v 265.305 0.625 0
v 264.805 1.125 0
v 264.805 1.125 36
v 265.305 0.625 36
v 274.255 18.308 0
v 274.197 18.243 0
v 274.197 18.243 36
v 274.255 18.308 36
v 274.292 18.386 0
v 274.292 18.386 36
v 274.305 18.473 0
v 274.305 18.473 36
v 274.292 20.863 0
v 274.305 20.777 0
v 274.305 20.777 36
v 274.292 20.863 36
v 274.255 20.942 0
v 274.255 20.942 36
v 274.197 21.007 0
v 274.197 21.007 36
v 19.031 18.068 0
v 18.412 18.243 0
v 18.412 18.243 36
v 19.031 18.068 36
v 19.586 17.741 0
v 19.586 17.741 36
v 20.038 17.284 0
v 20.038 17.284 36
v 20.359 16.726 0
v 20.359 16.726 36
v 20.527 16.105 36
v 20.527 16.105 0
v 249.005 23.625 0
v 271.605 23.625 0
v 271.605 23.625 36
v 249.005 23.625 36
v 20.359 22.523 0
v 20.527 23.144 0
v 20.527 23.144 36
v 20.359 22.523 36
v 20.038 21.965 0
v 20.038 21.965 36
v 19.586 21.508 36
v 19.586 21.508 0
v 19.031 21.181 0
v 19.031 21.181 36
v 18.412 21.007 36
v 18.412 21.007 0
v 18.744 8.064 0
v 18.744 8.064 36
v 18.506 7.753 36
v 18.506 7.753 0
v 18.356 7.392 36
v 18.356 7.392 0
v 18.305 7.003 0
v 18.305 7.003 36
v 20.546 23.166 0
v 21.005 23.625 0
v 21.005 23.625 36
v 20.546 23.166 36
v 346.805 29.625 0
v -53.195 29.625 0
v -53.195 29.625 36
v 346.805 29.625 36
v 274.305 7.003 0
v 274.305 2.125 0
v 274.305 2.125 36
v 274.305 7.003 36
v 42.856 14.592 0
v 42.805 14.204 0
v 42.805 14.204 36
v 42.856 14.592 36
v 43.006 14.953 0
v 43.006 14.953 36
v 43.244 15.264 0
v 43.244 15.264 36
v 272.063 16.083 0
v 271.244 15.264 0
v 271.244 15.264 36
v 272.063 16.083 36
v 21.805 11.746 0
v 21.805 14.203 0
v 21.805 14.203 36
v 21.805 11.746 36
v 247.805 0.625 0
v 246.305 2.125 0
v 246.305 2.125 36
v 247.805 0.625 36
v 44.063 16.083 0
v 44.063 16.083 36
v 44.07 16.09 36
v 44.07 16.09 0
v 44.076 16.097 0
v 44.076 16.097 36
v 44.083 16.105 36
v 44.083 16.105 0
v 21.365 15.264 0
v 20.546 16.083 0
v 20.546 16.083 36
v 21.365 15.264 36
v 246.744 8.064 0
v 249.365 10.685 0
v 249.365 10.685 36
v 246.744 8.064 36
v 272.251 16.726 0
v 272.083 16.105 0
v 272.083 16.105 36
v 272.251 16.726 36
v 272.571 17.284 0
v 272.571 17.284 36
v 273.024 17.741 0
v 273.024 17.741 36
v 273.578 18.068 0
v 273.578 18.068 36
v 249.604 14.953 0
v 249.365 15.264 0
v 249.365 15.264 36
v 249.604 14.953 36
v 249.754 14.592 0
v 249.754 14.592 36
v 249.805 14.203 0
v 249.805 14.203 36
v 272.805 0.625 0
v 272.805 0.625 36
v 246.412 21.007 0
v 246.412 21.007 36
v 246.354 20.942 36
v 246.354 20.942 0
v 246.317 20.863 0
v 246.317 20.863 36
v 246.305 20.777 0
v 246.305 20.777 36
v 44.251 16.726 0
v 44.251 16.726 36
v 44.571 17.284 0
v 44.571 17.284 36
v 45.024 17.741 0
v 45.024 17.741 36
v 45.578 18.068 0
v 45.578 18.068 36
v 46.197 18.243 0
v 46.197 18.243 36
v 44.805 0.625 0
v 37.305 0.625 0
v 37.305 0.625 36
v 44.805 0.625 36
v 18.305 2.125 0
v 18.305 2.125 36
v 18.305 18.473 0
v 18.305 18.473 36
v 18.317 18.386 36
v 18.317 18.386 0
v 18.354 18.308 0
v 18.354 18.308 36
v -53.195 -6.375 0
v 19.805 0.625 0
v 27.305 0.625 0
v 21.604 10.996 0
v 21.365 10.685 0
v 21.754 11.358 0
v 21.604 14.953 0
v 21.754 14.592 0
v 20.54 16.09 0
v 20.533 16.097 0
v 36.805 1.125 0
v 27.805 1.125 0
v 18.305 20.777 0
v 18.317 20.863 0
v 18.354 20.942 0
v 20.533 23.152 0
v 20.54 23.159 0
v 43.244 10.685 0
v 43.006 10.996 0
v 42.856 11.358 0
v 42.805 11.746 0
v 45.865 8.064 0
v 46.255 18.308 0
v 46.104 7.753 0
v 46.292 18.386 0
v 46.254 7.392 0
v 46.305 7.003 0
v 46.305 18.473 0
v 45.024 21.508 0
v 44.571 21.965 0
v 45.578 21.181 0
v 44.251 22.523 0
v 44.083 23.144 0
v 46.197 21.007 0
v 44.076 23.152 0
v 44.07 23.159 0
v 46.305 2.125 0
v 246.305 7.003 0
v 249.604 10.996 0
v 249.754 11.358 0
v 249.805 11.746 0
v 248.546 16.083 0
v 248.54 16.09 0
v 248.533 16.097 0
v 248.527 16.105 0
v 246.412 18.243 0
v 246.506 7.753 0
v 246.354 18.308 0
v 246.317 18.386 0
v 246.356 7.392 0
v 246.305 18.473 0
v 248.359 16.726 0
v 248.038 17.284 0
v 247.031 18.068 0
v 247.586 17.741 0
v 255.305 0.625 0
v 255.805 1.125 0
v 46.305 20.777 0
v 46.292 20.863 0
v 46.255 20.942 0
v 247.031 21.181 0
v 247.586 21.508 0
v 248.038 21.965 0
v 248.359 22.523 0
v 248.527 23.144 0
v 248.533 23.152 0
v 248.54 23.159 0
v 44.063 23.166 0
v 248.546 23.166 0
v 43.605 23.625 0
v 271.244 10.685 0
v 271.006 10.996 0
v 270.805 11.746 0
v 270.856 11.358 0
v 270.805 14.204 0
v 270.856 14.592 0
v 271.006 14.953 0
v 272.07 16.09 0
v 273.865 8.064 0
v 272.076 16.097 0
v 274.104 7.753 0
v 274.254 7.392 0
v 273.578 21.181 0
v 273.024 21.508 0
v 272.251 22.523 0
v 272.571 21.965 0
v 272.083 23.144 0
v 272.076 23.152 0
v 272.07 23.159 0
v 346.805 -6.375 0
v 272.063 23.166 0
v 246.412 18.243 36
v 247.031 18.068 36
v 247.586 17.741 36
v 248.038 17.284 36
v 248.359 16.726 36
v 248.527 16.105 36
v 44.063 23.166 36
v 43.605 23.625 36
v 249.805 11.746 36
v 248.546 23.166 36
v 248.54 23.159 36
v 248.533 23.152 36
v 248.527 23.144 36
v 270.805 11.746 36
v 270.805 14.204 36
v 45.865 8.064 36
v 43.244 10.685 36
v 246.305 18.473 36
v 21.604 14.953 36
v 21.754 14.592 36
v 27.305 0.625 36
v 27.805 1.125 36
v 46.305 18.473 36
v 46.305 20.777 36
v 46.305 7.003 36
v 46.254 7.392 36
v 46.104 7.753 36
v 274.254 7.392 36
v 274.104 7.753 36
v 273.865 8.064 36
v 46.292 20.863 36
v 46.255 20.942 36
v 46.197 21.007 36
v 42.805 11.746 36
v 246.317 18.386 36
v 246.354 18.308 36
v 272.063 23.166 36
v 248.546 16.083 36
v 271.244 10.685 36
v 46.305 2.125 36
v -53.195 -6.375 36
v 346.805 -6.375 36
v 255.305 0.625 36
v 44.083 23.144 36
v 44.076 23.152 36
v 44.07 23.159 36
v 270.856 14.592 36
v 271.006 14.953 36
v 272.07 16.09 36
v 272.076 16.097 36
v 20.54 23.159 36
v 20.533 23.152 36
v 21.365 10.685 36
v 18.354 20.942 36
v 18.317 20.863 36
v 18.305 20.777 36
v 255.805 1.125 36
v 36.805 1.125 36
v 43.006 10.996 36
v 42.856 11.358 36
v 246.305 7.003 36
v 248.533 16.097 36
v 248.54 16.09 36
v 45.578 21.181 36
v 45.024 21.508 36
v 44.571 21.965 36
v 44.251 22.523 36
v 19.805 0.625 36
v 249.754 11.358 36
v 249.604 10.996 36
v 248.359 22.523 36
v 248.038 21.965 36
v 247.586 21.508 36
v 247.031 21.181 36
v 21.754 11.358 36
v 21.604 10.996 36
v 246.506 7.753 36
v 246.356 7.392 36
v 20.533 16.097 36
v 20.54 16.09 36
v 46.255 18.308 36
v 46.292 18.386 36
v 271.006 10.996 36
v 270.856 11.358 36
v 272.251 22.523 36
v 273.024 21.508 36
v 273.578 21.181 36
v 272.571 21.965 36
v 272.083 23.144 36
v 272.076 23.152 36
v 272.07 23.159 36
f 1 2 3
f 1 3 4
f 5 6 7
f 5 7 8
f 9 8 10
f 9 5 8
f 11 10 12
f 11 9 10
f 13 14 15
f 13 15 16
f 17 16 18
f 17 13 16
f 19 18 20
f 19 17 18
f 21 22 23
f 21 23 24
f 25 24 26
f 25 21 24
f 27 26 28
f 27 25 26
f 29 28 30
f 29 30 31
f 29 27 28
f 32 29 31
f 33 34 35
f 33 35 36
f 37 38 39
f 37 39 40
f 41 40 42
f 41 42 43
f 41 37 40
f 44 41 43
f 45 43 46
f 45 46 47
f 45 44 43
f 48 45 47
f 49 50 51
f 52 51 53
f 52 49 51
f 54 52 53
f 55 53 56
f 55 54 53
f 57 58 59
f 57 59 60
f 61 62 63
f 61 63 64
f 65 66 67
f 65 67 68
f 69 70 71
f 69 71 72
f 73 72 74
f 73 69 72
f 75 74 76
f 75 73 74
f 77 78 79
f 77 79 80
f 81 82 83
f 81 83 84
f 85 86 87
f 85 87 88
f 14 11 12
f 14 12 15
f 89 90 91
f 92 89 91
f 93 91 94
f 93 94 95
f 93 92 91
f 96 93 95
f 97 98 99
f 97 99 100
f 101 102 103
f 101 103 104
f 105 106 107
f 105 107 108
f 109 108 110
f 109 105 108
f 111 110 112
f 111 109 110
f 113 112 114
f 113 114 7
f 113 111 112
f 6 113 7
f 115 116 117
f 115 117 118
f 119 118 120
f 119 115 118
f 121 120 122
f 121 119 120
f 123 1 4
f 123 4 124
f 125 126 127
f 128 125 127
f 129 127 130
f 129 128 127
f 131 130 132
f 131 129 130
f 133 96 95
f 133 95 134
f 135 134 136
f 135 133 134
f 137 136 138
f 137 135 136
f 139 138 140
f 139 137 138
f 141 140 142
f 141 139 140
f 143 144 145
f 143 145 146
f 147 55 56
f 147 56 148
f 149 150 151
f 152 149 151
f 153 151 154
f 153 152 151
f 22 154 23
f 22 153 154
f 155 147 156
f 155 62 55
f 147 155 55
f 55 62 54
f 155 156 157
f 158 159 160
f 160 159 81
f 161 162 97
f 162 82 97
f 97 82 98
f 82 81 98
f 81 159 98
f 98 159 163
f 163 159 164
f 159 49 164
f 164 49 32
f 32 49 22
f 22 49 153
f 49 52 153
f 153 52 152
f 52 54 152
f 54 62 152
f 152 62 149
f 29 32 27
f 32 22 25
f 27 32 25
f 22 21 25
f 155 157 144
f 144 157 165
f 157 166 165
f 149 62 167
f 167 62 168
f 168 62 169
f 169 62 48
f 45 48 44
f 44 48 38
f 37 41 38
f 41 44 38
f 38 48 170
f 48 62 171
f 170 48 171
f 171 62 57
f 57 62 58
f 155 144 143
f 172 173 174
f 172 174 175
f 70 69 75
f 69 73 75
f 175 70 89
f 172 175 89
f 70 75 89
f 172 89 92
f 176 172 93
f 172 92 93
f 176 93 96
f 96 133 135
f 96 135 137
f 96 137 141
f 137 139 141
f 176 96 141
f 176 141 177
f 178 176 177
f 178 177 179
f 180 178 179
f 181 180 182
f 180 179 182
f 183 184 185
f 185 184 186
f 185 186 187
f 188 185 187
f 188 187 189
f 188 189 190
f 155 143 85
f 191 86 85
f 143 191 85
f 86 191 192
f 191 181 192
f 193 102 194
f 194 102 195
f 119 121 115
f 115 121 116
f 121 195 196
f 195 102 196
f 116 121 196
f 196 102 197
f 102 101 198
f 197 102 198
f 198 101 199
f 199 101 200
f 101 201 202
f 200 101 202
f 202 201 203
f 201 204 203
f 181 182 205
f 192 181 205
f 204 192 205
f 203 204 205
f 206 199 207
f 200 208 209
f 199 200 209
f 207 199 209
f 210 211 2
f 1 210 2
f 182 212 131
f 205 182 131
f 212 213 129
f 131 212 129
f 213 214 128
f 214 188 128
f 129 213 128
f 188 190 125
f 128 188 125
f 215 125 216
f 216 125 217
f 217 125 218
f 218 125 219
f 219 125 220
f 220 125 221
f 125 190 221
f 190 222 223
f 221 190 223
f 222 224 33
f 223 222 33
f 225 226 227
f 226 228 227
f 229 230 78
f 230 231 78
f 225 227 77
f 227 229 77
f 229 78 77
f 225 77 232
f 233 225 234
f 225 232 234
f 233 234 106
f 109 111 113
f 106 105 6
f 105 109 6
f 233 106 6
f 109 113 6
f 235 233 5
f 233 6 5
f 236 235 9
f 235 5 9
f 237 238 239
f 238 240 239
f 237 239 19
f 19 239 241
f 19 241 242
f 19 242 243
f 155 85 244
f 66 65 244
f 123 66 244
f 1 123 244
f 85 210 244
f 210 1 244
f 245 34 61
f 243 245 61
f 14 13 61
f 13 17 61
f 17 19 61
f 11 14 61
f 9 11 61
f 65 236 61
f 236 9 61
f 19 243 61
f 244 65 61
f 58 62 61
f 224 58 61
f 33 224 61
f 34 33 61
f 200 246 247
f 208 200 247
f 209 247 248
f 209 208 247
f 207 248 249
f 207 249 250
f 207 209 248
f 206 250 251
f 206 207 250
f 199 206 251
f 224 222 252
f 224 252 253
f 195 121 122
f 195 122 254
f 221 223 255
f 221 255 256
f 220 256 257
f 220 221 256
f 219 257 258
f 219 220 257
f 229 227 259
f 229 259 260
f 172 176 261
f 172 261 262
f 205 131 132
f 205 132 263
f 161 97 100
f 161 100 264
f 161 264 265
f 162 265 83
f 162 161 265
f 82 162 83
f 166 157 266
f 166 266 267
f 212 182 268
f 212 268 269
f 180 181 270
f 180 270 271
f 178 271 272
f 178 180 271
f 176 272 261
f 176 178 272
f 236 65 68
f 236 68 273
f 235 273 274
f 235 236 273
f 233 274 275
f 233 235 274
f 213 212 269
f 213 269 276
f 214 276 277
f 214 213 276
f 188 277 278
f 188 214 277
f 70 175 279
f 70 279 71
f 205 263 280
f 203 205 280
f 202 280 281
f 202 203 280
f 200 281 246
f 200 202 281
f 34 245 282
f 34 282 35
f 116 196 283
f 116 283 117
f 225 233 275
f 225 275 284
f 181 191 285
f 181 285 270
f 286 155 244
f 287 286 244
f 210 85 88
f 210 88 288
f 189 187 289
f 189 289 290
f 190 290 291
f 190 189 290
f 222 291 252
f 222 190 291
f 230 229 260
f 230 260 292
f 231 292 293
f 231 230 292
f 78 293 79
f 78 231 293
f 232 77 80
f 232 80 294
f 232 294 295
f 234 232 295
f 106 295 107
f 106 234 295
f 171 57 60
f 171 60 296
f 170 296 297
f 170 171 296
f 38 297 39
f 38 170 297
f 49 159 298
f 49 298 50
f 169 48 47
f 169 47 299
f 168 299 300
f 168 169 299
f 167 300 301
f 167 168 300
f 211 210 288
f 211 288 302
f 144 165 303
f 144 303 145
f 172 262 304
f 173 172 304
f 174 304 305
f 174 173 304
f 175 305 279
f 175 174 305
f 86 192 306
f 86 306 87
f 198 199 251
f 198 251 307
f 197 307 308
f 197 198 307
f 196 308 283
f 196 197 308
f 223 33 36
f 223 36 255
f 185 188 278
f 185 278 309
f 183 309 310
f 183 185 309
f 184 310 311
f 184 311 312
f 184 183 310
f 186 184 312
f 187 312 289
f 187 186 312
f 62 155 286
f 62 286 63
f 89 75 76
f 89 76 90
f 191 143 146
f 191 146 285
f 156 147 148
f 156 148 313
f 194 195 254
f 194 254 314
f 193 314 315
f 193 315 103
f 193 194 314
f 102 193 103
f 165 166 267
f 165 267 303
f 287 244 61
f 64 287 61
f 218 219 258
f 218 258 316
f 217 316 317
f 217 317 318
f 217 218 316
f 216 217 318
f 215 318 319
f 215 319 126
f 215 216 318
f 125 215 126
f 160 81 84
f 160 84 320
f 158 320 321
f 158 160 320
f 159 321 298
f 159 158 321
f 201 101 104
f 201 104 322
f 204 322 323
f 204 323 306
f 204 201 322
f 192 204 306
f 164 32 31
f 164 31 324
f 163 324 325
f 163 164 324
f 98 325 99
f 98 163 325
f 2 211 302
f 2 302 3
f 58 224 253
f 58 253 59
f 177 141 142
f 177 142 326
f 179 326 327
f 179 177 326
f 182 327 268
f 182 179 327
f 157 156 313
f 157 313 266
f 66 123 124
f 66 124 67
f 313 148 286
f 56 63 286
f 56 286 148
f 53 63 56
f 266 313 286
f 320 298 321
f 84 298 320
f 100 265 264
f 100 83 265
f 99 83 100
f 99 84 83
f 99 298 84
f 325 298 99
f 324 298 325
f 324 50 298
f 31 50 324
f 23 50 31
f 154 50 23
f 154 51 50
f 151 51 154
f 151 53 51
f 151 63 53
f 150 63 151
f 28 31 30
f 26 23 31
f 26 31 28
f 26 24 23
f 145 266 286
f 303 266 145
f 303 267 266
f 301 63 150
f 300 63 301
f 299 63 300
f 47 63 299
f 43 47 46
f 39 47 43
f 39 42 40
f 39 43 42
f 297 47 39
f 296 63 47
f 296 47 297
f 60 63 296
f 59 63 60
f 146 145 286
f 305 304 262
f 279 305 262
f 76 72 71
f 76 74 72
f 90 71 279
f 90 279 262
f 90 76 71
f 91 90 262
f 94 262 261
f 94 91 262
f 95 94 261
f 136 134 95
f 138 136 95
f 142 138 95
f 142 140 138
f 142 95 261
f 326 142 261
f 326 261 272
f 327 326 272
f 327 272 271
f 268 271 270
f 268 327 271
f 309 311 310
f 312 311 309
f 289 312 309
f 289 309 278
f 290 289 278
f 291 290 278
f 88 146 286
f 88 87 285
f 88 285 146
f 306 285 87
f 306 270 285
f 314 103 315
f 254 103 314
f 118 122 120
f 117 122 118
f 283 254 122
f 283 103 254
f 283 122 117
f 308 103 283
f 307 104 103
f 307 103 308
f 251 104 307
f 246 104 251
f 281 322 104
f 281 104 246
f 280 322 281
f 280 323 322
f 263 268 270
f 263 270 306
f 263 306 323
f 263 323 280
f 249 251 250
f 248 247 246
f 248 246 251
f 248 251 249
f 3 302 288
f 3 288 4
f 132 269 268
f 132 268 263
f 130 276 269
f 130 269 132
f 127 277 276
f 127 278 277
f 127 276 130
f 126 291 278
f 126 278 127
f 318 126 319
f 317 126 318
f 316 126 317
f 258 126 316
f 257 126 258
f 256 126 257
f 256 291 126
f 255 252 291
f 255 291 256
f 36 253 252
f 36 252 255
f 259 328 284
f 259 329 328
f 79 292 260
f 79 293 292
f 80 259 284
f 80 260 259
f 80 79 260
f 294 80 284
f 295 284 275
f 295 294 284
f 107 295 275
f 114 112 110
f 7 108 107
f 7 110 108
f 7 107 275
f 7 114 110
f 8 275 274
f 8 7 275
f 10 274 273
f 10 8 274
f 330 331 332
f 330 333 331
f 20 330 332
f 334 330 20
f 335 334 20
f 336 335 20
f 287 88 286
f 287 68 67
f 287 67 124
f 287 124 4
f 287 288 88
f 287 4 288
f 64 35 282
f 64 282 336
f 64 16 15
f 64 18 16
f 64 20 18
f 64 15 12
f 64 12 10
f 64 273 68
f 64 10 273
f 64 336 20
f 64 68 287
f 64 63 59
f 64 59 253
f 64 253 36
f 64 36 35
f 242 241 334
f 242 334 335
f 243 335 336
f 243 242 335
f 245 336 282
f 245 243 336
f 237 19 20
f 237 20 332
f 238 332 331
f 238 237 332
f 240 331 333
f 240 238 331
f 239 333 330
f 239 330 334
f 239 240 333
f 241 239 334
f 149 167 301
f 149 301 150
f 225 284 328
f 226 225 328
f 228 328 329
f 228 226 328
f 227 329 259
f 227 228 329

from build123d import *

# Parameters (mm, degrees)
SKETCH_1_W      = 400
SKETCH_1_H      = 36
EXTRUDE_1_DEPTH = 36


with BuildPart() as part:
    # 草图1 → 凸台-拉伸1 (new body)
    with BuildSketch(Plane.XY):
        with Locations((146.804691074, 11.624598534)):
            Rectangle(SKETCH_1_W, SKETCH_1_H)
        with BuildLine():
            Line((18.304691074, 20.776588155), (18.304691074, 18.472608914))
            ThreePointArc((18.304691074, 18.472608914), (18.332858946, 18.345694397), (18.412073037, 18.242612627))
            ThreePointArc((18.412073037, 18.242612627), (19.826614478, 17.527140145), (20.52653516, 16.104839403))
            ThreePointArc((20.52653516, 16.104839403), (20.536242904, 16.093568263), (20.546497421, 16.082792187))
            Line((20.546497421, 16.082792187), (21.365351246, 15.263938362))
            ThreePointArc((21.365351246, 15.263938362), (21.690510372, 14.777303339), (21.804691074, 14.203278191))
            Line((21.804691074, 14.203278191), (21.804691074, 11.745724673))
            ThreePointArc((21.804691074, 11.745724673), (21.690473216, 11.171804017), (21.36535125, 10.685258701))
            Line((21.36535125, 10.685258701), (18.744030902, 8.063938362))
            ThreePointArc((18.744030902, 8.063938362), (18.418871775, 7.577303339), (18.304691074, 7.003278191))
            Line((18.304691074, 7.003278191), (18.304691074, 2.124598534))
            Line((18.304691074, 2.124598534), (19.804691074, 0.624598534))
            Line((19.804691074, 0.624598534), (27.304691074, 0.624598534))
            Line((27.304691074, 0.624598534), (27.804691074, 1.124598534))
            Line((27.804691074, 1.124598534), (36.804691074, 1.124598534))
            Line((36.804691074, 1.124598534), (37.304691074, 0.624598534))
            Line((37.304691074, 0.624598534), (44.804691074, 0.624598534))
            Line((44.804691074, 0.624598534), (46.304691074, 2.124598534))
            Line((46.304691074, 2.124598534), (46.304691074, 7.003472395))
            ThreePointArc((46.304691074, 7.003472395), (46.190473222, 7.577393054), (45.86535125, 8.063938367))
            Line((45.86535125, 8.063938367), (43.244030902, 10.685258706))
            ThreePointArc((43.244030902, 10.685258706), (42.918871775, 11.171893729), (42.804691074, 11.745918878))
            Line((42.804691074, 11.745918878), (42.804691075, 14.203500139))
            ThreePointArc((42.804691075, 14.203500139), (42.91891424, 14.777405867), (43.244030896, 15.263938368))
            Line((43.244030896, 15.263938368), (44.062884727, 16.082792187))
            ThreePointArc((44.062884727, 16.082792187), (44.073139243, 16.093568263), (44.082846988, 16.104839403))
            ThreePointArc((44.082846988, 16.104839403), (44.782767669, 17.527140145), (46.19730911, 18.242612627))
            ThreePointArc((46.19730911, 18.242612627), (46.276523201, 18.345694397), (46.304691074, 18.472608914))
            Line((46.304691074, 18.472608914), (46.304691074, 20.776588155))
            ThreePointArc((46.304691074, 20.776588155), (46.276523201, 20.903502671), (46.19730911, 21.006584442))
            ThreePointArc((46.19730911, 21.006584442), (44.782767669, 21.722056923), (44.082846988, 23.144357665))
            ThreePointArc((44.082846988, 23.144357665), (44.073139243, 23.155628805), (44.062884727, 23.166404881))
            Line((44.062884727, 23.166404881), (43.604691074, 23.624598534))
            Line((43.604691074, 23.624598534), (21.004691074, 23.624598534))
            Line((21.004691074, 23.624598534), (20.546497421, 23.166404881))
            ThreePointArc((20.546497421, 23.166404881), (20.536242905, 23.155628805), (20.52653516, 23.144357665))
            ThreePointArc((20.52653516, 23.144357665), (19.826614478, 21.722056923), (18.412073037, 21.006584442))
            ThreePointArc((18.412073037, 21.006584442), (18.332858946, 20.903502671), (18.304691074, 20.776588155))
        make_face(mode=Mode.SUBTRACT)
        with BuildLine():
            Line((246.304691074, 20.776588155), (246.304691074, 18.472608914))
            ThreePointArc((246.304691074, 18.472608914), (246.332858946, 18.345694397), (246.412073037, 18.242612627))
            ThreePointArc((246.412073037, 18.242612627), (247.826614478, 17.527140145), (248.52653516, 16.104839403))
            ThreePointArc((248.52653516, 16.104839403), (248.536242904, 16.093568263), (248.546497421, 16.082792187))
            Line((248.546497421, 16.082792187), (249.365351245, 15.263938362))
            ThreePointArc((249.365351245, 15.263938362), (249.690510372, 14.777303339), (249.804691074, 14.203278191))
            Line((249.804691074, 14.203278191), (249.804691074, 11.745724673))
            ThreePointArc((249.804691074, 11.745724673), (249.690473216, 11.171804017), (249.36535125, 10.685258701))
            Line((249.36535125, 10.685258701), (246.744030902, 8.063938362))
            ThreePointArc((246.744030902, 8.063938362), (246.418871775, 7.577303339), (246.304691074, 7.003278191))
            Line((246.304691074, 7.003278191), (246.304691074, 2.124598534))
            Line((246.304691074, 2.124598534), (247.804691074, 0.624598534))
            Line((247.804691074, 0.624598534), (255.304691074, 0.624598534))
            Line((255.304691074, 0.624598534), (255.804691074, 1.124598534))
            Line((255.804691074, 1.124598534), (264.804691074, 1.124598534))
            Line((264.804691074, 1.124598534), (265.304691074, 0.624598534))
            Line((265.304691074, 0.624598534), (272.804691074, 0.624598534))
            Line((272.804691074, 0.624598534), (274.304691074, 2.124598534))
            Line((274.304691074, 2.124598534), (274.304691074, 7.003472395))
            ThreePointArc((274.304691074, 7.003472395), (274.190473222, 7.577393054), (273.86535125, 8.063938367))
            Line((273.86535125, 8.063938367), (271.244030902, 10.685258706))
            ThreePointArc((271.244030902, 10.685258706), (270.918871775, 11.171893729), (270.804691074, 11.745918878))
            Line((270.804691074, 11.745918878), (270.804691074, 14.203500139))
            ThreePointArc((270.804691074, 14.203500139), (270.918914239, 14.777405867), (271.244030896, 15.263938368))
            Line((271.244030896, 15.263938368), (272.062884727, 16.082792187))
            ThreePointArc((272.062884727, 16.082792187), (272.073139243, 16.093568263), (272.082846987, 16.104839403))
            ThreePointArc((272.082846987, 16.104839403), (272.782767669, 17.527140145), (274.19730911, 18.242612627))
            ThreePointArc((274.19730911, 18.242612627), (274.276523201, 18.345694397), (274.304691074, 18.472608914))
            Line((274.304691074, 18.472608914), (274.304691074, 20.776588155))
            ThreePointArc((274.304691074, 20.776588155), (274.276523201, 20.903502671), (274.19730911, 21.006584442))
            ThreePointArc((274.19730911, 21.006584442), (272.782767669, 21.722056923), (272.082846987, 23.144357665))
            ThreePointArc((272.082846987, 23.144357665), (272.073139243, 23.155628805), (272.062884727, 23.166404881))
            Line((272.062884727, 23.166404881), (271.604691074, 23.624598534))
            Line((271.604691074, 23.624598534), (249.004691074, 23.624598534))
            Line((249.004691074, 23.624598534), (248.546497421, 23.166404881))
            ThreePointArc((248.546497421, 23.166404881), (248.536242905, 23.155628805), (248.52653516, 23.144357665))
            ThreePointArc((248.52653516, 23.144357665), (247.826614478, 21.722056923), (246.412073037, 21.006584442))
            ThreePointArc((246.412073037, 21.006584442), (246.332858946, 20.903502671), (246.304691074, 20.776588155))
        make_face(mode=Mode.SUBTRACT)
    extrude(amount=EXTRUDE_1_DEPTH)


solid = part.part
